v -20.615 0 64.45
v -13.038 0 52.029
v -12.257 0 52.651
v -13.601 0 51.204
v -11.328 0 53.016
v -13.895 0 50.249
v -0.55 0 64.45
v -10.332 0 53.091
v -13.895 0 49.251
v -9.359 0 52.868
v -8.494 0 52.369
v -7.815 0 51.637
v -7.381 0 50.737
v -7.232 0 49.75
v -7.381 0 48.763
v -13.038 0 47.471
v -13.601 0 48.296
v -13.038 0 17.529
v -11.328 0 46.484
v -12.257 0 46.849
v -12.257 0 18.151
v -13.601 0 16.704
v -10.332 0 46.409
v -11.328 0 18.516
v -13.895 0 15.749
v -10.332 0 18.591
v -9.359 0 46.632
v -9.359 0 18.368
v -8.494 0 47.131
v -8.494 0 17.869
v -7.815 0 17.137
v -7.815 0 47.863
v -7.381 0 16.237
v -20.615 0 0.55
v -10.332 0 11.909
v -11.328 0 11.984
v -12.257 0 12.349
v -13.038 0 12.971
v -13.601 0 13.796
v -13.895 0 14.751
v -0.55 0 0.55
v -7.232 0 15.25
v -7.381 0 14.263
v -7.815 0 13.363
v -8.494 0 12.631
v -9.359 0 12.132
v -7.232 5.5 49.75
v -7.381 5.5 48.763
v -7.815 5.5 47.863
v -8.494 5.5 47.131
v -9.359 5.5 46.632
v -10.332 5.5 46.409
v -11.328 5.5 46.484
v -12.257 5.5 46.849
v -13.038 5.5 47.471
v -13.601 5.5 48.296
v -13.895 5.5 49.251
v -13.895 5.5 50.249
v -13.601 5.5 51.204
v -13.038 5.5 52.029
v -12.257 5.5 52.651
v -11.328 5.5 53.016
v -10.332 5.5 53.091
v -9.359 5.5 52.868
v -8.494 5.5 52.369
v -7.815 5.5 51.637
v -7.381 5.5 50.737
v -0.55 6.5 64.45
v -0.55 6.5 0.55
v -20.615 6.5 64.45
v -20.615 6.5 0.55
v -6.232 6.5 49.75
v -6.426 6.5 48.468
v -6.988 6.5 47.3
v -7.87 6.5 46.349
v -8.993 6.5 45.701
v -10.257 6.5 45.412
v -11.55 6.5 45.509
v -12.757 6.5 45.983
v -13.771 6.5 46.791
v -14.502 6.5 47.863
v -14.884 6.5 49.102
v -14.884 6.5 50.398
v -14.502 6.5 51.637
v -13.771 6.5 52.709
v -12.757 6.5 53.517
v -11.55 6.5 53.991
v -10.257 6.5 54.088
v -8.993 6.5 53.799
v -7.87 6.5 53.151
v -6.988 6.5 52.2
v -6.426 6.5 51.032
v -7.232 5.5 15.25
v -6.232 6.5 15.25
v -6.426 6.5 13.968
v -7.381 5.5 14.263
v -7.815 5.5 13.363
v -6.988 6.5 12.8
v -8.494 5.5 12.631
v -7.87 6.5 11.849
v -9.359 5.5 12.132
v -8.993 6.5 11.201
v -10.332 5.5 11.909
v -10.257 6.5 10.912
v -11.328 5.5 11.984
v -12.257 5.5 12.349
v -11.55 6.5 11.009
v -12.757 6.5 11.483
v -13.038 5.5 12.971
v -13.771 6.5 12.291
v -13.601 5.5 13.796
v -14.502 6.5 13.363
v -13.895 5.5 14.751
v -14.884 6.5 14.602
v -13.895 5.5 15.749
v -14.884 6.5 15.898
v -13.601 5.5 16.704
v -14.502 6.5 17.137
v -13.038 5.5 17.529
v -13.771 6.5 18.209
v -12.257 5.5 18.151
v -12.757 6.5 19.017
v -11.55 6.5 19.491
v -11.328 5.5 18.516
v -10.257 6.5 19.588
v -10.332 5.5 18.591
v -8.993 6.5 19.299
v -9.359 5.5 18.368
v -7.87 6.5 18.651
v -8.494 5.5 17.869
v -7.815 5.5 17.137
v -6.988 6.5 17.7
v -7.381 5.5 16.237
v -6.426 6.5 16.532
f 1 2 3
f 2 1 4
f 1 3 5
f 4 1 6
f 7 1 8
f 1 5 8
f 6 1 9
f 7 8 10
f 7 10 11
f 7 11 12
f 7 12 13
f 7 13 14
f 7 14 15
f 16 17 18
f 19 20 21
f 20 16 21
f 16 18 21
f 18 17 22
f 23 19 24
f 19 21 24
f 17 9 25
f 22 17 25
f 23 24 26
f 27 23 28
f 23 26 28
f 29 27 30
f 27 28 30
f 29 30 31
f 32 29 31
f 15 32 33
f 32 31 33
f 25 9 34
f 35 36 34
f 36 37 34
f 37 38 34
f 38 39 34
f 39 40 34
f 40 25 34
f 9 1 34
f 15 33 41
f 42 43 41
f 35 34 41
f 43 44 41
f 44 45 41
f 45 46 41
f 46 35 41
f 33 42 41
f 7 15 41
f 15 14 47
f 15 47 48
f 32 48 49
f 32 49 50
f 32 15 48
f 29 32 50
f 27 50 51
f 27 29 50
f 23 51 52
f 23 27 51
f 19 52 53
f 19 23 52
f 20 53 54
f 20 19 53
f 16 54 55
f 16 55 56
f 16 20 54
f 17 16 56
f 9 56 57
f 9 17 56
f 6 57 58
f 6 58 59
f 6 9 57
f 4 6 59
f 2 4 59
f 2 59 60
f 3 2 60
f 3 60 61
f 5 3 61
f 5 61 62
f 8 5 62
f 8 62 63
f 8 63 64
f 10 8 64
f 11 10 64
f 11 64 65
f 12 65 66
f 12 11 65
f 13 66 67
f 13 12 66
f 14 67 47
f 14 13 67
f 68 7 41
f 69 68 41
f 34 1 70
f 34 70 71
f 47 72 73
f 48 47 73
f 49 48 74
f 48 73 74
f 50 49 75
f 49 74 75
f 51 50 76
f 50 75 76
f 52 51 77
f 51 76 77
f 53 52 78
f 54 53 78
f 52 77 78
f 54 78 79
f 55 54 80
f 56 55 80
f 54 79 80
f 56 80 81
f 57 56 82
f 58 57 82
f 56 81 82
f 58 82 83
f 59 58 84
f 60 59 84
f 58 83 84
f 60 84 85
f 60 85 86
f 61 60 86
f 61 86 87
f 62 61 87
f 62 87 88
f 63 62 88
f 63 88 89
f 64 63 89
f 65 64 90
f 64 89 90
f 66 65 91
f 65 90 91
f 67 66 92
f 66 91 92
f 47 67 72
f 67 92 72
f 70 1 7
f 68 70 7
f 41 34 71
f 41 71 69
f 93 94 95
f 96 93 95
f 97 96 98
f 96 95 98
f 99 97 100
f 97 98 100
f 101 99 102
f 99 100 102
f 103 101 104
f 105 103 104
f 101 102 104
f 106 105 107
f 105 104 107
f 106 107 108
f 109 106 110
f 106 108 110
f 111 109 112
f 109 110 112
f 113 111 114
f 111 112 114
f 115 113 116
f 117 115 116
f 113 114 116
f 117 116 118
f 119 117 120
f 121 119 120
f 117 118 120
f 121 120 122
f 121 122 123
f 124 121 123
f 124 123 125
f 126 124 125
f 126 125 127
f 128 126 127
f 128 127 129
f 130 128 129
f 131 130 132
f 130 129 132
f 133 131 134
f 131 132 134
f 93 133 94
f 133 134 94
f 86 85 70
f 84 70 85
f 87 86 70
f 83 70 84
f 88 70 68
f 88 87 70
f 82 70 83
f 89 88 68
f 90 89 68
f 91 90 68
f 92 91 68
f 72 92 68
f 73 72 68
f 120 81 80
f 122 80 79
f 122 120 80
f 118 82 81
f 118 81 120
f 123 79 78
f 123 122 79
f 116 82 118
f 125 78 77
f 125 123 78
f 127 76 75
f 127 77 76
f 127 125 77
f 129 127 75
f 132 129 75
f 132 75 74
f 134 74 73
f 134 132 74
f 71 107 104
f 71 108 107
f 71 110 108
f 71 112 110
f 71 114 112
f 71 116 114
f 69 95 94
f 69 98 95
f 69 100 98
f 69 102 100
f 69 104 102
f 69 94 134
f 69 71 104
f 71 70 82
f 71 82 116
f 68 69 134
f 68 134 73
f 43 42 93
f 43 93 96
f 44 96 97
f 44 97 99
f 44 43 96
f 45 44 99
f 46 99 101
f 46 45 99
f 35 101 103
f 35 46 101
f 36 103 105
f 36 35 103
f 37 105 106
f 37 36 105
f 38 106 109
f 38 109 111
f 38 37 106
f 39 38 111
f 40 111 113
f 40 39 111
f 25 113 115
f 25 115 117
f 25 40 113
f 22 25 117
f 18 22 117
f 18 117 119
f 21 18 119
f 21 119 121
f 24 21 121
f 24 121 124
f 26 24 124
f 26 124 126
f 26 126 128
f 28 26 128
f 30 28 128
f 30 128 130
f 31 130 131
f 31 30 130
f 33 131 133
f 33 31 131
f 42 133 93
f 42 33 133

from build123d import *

# Parameters (mm, degrees)
SKETCH1_W           = 20.06486665
SKETCH1_H           = 63.9
SKETCH1_R           = 3.35
BOSS_EXTRUDE1_DEPTH = 6.5
CHAMFER1_SIZE       = 1


with BuildPart() as part:
    # Sketch1 → Boss-Extrude1 (new body)
    with BuildSketch(Plane(origin=(0, 0, 0), x_dir=(1, 0, 0), z_dir=(0, 1, 0))):
        with Locations((-10.582433325, -32.5)):
            Rectangle(SKETCH1_W, SKETCH1_H)
        with Locations((-10.582433325, -15.25)):
            Circle(SKETCH1_R, mode=Mode.SUBTRACT)
        with Locations((-10.582433325, -49.75)):
            Circle(SKETCH1_R, mode=Mode.SUBTRACT)
    extrude(amount=BOSS_EXTRUDE1_DEPTH)

    # Chamfer1
    chamfer1_edges = [part.edges().sort_by_distance(p)[0] for p in [
        (-13.932433325, 6.5, 15.25),
        (-13.932433325, 6.5, 49.75),
    ]]
    chamfer(chamfer1_edges, length=CHAMFER1_SIZE)


solid = part.part
